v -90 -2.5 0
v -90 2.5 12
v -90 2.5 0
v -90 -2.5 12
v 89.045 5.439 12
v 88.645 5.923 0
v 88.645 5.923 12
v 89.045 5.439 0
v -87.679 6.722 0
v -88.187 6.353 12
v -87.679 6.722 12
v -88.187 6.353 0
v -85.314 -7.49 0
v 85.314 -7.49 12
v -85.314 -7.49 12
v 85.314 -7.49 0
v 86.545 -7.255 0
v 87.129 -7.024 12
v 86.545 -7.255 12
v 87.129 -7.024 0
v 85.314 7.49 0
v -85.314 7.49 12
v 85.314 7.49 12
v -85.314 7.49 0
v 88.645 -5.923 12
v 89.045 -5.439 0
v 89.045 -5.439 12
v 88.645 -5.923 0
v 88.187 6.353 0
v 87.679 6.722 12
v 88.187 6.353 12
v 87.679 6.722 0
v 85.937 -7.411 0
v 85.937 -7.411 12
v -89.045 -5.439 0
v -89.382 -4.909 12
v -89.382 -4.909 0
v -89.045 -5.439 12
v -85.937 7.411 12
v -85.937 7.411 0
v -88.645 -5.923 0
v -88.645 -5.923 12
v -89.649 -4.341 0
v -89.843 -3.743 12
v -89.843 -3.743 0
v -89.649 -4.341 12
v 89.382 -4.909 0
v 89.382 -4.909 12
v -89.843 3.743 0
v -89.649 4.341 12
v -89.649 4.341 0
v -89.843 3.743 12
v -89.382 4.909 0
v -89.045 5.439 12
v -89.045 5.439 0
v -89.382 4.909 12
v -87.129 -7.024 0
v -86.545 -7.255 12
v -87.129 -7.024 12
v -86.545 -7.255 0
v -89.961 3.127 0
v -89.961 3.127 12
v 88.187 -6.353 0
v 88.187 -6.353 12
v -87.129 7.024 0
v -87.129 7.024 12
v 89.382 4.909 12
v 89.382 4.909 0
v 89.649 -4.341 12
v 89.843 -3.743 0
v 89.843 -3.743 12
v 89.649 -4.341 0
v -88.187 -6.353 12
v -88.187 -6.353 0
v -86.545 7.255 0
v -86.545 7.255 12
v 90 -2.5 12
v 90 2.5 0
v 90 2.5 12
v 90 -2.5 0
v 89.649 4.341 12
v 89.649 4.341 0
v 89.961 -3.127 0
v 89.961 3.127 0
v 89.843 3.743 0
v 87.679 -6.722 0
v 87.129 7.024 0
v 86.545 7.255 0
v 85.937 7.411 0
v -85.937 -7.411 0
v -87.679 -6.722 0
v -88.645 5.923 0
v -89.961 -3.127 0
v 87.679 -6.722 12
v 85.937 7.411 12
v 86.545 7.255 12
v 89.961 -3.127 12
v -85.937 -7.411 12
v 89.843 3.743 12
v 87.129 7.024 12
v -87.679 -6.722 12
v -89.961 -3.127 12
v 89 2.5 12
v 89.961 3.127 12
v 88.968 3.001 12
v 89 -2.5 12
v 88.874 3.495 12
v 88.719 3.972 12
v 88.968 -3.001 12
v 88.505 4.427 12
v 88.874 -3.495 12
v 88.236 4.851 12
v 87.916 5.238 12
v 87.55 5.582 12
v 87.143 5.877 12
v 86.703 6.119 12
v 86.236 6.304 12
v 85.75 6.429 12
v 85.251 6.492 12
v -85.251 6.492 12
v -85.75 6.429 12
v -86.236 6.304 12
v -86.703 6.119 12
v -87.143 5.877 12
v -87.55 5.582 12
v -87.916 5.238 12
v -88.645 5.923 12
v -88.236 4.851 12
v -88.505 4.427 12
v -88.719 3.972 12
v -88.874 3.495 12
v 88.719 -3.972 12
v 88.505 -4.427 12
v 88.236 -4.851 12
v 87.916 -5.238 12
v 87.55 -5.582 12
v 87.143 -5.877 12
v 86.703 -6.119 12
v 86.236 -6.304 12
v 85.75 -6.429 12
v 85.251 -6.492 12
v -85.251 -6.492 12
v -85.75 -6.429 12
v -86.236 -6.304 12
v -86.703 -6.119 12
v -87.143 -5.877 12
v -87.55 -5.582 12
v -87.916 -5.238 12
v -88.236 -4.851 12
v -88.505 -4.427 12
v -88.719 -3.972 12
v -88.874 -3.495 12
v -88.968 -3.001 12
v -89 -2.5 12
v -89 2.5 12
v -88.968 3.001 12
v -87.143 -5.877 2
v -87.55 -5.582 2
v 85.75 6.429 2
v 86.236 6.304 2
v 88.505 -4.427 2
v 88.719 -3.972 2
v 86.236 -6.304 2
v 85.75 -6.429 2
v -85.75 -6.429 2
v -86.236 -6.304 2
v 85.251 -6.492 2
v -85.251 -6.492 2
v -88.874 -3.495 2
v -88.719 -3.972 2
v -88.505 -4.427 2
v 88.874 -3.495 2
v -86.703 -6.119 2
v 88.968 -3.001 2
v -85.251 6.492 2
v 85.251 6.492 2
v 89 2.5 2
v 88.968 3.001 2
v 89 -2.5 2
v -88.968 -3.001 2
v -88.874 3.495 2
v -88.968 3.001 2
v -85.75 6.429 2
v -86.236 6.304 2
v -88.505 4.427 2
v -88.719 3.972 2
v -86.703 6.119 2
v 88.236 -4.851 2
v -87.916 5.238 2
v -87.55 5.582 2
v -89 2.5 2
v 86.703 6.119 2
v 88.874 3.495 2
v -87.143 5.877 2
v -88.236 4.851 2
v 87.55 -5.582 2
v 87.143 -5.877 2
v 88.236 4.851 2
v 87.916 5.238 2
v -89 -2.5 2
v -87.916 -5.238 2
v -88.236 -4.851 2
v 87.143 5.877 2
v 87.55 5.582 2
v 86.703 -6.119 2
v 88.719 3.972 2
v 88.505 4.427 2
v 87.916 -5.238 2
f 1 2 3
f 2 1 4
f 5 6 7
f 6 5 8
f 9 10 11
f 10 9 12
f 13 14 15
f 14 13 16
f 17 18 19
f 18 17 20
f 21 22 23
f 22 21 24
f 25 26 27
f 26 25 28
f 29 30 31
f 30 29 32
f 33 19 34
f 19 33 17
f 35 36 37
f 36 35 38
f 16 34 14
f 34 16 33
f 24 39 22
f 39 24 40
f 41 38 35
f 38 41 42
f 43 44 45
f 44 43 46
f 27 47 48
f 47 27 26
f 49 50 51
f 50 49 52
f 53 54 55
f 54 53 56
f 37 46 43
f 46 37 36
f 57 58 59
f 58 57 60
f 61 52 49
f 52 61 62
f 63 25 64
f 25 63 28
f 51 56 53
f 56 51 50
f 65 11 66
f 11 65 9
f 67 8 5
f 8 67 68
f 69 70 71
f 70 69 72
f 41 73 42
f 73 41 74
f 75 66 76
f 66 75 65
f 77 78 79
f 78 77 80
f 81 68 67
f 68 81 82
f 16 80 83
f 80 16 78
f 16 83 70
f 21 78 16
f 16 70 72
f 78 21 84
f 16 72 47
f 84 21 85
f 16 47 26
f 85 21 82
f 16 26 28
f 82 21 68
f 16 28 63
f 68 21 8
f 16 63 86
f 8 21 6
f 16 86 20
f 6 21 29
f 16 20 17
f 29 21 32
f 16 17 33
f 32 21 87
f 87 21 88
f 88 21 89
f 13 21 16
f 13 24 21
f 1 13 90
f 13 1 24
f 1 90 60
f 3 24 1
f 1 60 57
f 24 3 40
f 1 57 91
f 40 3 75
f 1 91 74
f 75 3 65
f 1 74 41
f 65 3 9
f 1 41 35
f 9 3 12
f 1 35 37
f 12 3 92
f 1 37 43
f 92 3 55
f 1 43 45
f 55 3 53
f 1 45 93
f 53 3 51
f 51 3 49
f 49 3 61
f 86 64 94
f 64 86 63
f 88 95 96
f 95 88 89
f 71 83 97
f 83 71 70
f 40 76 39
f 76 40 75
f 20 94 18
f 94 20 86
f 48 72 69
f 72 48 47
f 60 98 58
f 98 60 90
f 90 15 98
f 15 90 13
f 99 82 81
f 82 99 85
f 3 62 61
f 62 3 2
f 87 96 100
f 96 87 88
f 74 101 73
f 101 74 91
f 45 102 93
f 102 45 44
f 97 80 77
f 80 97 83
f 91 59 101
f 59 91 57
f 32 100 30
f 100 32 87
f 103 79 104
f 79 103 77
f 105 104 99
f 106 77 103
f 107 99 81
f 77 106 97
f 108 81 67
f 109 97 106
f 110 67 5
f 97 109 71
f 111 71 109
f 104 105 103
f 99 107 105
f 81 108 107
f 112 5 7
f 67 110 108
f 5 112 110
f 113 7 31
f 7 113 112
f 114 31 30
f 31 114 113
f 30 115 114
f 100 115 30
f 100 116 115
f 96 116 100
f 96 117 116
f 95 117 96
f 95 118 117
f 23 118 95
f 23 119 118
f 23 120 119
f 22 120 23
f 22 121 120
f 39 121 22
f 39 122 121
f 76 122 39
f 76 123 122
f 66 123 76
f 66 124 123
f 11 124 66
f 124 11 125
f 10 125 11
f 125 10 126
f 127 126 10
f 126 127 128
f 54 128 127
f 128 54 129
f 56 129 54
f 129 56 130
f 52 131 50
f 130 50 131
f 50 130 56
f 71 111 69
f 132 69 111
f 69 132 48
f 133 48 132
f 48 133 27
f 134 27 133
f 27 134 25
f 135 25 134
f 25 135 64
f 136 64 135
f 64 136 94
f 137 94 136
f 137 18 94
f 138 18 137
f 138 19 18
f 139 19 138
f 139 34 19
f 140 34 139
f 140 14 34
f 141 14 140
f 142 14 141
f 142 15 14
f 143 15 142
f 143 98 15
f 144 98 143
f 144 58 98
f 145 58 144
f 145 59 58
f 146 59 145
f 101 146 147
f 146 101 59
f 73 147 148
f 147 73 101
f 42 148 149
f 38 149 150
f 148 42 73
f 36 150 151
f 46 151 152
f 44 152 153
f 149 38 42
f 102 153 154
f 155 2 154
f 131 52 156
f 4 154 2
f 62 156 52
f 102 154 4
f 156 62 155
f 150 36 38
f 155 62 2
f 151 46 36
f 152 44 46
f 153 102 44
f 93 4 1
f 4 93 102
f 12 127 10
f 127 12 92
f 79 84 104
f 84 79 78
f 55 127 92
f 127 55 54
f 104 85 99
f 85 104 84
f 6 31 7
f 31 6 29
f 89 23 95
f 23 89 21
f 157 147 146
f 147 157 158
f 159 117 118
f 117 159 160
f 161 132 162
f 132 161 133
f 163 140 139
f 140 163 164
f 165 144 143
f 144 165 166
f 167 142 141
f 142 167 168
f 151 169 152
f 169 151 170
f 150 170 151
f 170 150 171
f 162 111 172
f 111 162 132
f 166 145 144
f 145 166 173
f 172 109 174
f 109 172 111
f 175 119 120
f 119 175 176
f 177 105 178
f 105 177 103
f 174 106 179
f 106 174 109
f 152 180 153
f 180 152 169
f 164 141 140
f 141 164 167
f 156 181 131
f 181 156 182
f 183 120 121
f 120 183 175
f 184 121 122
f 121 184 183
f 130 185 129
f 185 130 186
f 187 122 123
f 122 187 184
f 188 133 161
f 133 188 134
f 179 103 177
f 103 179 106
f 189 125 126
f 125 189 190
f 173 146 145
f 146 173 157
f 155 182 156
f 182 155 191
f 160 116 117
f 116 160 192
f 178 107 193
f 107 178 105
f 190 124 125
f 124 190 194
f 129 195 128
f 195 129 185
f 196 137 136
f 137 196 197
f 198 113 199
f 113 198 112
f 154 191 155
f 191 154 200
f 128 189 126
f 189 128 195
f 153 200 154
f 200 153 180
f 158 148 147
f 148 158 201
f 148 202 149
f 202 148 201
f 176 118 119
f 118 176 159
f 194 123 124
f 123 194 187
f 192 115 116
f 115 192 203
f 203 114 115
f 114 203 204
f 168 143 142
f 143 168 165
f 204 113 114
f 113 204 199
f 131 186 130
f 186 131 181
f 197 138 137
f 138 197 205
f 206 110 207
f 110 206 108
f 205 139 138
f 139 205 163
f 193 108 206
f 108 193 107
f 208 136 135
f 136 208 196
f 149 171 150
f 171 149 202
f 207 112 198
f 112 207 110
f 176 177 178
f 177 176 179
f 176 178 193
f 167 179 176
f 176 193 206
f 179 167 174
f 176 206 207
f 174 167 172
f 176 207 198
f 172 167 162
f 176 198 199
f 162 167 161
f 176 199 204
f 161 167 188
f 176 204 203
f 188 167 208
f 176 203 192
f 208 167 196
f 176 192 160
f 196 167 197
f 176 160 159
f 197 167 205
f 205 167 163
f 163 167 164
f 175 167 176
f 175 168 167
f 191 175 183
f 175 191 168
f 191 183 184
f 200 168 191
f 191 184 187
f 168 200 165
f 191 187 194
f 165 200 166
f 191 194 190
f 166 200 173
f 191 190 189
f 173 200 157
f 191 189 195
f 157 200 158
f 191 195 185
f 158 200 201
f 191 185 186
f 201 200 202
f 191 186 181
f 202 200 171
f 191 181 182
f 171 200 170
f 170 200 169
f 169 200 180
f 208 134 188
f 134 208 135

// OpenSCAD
$fn = 50;


difference() {
	union() {
		hull() {
			translate(v = [-85.0000000000, 2.5000000000, 0]) {
				cylinder(h = 12, r = 5);
			}
			translate(v = [85.0000000000, 2.5000000000, 0]) {
				cylinder(h = 12, r = 5);
			}
			translate(v = [-85.0000000000, -2.5000000000, 0]) {
				cylinder(h = 12, r = 5);
			}
			translate(v = [85.0000000000, -2.5000000000, 0]) {
				cylinder(h = 12, r = 5);
			}
		}
	}
	union() {
		translate(v = [0, 0, 2]) {
			hull() {
				translate(v = [-85.0000000000, 2.5000000000, 0]) {
					cylinder(h = 10, r = 4);
				}
				translate(v = [85.0000000000, 2.5000000000, 0]) {
					cylinder(h = 10, r = 4);
				}
				translate(v = [-85.0000000000, -2.5000000000, 0]) {
					cylinder(h = 10, r = 4);
				}
				translate(v = [85.0000000000, -2.5000000000, 0]) {
					cylinder(h = 10, r = 4);
				}
			}
		}
	}
}
